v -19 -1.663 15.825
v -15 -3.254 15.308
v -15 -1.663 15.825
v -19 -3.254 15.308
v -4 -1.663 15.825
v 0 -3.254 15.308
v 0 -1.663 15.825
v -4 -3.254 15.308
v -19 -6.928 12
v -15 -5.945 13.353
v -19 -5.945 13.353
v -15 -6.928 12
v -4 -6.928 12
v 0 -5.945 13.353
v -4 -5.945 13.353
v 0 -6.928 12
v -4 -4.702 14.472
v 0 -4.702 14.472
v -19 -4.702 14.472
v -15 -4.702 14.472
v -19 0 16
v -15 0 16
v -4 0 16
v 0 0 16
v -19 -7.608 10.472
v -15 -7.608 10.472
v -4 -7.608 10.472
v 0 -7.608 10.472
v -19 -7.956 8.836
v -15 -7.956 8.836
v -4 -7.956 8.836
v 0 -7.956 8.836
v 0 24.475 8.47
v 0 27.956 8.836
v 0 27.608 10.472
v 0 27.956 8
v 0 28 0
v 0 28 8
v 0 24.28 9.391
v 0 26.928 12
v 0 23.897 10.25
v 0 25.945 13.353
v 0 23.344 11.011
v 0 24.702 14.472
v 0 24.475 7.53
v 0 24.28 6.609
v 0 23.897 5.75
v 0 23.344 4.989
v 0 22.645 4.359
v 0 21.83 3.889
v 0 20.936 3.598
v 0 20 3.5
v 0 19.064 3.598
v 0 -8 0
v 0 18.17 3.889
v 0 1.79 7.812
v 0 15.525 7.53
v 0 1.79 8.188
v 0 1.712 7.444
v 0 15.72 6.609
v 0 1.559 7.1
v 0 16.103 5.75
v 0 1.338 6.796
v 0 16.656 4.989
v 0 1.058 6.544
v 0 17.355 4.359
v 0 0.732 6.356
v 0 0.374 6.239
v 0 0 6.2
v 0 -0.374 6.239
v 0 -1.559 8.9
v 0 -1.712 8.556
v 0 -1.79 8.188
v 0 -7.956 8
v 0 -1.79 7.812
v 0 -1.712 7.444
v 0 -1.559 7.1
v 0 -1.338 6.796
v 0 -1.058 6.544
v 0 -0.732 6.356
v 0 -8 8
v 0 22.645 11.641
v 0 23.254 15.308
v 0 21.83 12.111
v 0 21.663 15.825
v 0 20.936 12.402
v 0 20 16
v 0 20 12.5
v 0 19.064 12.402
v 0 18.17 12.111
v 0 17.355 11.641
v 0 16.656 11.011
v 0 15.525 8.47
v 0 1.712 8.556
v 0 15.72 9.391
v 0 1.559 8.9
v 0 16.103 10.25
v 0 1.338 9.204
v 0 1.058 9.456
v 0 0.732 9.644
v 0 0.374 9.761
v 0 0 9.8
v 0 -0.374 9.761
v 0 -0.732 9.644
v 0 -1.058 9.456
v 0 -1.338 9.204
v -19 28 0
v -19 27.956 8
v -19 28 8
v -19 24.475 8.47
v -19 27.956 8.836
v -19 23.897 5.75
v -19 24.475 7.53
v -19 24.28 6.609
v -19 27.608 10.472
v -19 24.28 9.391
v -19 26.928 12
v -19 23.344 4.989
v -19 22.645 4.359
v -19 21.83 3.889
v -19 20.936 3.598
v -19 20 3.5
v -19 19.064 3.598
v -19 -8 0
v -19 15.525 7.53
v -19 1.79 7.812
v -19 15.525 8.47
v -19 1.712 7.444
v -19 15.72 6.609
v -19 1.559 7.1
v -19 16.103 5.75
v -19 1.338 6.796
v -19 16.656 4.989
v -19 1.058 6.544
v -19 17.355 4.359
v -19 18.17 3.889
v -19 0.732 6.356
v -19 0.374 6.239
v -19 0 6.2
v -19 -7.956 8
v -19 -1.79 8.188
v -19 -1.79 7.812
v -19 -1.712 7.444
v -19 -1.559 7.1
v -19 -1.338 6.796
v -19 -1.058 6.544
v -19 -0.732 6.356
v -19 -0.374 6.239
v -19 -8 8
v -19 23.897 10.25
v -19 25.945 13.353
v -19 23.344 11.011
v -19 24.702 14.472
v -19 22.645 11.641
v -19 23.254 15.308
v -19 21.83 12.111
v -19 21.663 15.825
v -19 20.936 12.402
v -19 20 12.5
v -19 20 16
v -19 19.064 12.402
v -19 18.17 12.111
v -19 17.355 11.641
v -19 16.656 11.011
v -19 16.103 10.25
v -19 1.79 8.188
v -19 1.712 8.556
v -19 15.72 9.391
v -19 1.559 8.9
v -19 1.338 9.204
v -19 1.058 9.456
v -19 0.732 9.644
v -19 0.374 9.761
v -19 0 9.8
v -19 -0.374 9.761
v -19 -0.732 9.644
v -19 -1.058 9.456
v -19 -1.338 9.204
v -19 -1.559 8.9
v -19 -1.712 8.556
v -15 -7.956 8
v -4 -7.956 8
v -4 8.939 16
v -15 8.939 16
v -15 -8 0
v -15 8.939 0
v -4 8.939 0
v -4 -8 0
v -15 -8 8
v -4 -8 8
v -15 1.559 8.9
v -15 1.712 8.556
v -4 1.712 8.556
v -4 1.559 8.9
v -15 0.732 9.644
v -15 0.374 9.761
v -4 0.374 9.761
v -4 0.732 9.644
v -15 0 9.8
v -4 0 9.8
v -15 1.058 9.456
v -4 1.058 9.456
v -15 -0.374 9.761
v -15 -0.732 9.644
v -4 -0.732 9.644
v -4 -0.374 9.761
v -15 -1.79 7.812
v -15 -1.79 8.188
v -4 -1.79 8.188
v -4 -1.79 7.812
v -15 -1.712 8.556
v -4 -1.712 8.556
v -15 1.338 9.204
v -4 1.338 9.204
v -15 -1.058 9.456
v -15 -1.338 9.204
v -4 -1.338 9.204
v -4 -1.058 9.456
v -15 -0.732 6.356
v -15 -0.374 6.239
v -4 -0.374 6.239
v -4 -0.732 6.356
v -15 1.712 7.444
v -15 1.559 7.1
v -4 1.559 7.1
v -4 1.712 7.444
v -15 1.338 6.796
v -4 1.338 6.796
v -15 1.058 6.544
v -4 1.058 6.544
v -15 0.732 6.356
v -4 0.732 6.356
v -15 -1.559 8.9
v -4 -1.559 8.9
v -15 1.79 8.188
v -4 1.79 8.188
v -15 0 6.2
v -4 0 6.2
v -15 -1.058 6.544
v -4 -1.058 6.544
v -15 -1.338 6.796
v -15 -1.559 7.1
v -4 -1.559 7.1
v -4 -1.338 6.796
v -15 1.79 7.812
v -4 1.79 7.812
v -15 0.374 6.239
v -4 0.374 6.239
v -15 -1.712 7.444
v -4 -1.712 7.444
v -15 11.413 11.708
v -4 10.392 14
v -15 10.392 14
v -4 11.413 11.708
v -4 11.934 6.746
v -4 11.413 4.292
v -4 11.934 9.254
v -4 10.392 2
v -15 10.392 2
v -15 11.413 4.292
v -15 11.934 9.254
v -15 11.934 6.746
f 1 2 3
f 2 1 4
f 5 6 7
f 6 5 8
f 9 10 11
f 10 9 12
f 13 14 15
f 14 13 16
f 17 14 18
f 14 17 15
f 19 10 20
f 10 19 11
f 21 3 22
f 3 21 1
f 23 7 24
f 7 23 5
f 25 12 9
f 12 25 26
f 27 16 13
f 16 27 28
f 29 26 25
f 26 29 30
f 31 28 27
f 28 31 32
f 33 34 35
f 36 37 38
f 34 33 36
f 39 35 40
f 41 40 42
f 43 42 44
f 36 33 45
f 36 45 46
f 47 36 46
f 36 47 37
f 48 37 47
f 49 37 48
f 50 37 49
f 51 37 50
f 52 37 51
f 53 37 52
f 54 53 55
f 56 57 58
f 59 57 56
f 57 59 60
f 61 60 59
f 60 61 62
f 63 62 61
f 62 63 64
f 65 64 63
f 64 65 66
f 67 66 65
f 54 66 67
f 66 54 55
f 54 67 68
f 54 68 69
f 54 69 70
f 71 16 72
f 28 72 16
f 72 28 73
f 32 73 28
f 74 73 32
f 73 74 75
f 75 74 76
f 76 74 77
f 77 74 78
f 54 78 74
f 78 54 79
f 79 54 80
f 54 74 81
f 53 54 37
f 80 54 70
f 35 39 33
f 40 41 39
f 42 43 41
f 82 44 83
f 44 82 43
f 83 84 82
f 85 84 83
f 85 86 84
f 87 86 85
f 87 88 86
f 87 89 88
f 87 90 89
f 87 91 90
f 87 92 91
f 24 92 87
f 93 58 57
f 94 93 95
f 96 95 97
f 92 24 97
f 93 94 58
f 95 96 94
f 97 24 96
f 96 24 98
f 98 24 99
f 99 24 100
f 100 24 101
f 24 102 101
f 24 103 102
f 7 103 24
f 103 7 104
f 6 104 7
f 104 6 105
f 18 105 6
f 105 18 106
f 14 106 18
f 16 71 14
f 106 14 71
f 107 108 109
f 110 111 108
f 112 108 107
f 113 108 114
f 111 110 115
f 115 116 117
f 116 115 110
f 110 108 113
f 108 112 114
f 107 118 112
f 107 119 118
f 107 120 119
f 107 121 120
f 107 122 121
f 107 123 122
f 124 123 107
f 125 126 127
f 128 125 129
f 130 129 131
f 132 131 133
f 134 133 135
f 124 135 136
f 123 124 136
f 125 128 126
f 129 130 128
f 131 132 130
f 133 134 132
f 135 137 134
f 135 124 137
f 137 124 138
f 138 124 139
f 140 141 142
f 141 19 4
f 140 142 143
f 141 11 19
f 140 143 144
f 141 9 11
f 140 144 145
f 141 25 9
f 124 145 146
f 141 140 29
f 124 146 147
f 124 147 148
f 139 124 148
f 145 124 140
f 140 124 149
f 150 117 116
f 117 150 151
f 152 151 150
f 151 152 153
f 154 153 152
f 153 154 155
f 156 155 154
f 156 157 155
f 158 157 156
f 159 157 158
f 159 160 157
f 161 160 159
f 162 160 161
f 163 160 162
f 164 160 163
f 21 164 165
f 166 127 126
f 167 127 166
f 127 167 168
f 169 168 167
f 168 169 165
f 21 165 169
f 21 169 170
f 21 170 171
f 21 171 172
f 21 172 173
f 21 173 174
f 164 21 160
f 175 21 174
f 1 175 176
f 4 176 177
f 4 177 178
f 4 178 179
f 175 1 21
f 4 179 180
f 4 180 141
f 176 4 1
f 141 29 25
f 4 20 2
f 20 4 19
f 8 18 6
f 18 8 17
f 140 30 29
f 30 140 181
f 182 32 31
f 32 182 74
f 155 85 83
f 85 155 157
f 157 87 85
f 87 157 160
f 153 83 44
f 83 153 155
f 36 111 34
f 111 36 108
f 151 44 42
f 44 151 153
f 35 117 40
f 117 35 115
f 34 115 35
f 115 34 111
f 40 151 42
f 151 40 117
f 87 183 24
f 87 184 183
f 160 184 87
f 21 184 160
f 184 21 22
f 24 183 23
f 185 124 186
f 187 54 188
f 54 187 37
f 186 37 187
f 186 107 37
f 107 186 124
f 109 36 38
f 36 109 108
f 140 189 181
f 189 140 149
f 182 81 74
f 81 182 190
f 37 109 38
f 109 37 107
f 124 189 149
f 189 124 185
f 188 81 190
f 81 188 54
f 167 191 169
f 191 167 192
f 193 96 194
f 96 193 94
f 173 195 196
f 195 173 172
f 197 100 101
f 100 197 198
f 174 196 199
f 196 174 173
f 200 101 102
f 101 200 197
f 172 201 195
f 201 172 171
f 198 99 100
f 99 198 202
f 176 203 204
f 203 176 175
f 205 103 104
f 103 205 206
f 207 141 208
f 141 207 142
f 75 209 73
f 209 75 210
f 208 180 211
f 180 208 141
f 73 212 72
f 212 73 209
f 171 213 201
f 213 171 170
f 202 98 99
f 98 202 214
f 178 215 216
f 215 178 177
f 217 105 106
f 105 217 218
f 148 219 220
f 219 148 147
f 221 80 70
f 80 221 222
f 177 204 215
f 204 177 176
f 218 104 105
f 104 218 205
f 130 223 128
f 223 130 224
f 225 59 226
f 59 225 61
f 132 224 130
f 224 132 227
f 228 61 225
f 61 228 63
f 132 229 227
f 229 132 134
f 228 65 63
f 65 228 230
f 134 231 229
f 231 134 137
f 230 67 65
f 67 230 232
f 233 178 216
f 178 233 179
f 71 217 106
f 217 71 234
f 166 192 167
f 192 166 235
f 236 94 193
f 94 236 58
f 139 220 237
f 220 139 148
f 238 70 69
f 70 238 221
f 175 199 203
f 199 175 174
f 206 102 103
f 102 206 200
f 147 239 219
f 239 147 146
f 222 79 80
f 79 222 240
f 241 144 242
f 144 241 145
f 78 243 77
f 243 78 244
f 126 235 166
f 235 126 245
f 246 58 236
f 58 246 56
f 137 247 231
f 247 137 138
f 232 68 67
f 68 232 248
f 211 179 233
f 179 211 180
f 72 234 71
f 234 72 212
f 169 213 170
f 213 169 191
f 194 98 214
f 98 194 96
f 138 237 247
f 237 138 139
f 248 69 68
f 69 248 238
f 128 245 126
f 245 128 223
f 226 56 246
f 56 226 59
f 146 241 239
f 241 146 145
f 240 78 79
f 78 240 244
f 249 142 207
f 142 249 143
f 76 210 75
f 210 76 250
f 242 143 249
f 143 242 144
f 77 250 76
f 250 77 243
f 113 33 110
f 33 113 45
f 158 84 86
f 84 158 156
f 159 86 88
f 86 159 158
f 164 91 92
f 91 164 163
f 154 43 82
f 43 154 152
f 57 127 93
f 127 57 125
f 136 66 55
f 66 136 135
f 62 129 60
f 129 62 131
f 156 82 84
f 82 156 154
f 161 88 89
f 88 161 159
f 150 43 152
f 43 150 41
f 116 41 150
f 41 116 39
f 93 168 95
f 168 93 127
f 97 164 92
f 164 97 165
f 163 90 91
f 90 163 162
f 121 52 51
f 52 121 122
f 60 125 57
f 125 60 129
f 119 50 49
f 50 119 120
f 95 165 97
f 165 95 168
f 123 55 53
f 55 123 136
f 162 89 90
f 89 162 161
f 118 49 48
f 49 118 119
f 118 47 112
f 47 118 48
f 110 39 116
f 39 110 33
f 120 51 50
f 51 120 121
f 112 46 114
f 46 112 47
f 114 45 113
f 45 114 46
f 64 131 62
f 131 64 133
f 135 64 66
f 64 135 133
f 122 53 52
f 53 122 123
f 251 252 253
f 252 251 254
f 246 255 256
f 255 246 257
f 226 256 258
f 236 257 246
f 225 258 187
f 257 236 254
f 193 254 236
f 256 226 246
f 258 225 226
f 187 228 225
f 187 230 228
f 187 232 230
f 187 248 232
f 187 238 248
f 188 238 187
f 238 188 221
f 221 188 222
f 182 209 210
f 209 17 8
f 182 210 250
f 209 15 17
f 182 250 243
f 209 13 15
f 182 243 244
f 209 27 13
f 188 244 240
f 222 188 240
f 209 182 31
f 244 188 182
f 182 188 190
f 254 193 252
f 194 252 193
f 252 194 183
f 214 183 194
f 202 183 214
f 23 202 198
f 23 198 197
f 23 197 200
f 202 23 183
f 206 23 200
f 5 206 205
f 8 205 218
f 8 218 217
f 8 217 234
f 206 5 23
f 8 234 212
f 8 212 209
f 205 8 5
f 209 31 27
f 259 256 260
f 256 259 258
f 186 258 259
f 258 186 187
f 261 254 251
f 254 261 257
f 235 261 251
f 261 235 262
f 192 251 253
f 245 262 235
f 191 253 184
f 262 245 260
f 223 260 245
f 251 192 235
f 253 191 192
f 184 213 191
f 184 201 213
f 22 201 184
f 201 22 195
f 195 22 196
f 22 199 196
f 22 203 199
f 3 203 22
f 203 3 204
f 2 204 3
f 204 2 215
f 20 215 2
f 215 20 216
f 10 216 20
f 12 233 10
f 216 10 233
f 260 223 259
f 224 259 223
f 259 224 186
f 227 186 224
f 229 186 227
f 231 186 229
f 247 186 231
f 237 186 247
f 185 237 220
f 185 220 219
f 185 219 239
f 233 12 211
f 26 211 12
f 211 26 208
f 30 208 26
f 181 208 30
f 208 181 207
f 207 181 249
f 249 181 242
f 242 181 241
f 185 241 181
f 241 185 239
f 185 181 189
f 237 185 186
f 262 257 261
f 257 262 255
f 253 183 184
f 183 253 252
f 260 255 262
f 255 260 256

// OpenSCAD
// file: parameters.scad
// PRUSA iteration3
// Y frame corners
// GNU GPL v3
// Josef Průša <iam@josefprusa.cz> and contributors
// http://www.reprap.org/wiki/Prusa_Mendel
// http://prusamendel.org
// Parameterized by D. Scott Williamson

// MASTER PARAMETERS FILE

// Default to original metric 
metric=true;

// mm in an inch (comversion rate)
inch2mm=25.4;

// Default facets for cylinders
$fn=30;

// Parameters related to printer base 
// affected parts:
//		y-corners.scad
//		y-motor.scad
// 		y-idler.scad
// 		y-distance.scad

	// horizontal rod dimensions
	horizontal_rod_radius = (metric ? 4 : ((5/16)*inch2mm/2));
	horizontal_rod_hole_radius= horizontal_rod_radius + 0.4;
	horizontal_rod_length=270;
	horizontal_rod_bridge_radius=2.6;
	horizontal_rod_washer_radius=(metric ? 10 : ((15/16)*inch2mm/2));
	horizontal_rod_lower_height=horizontal_rod_washer_radius;
	horizontal_rod_upper_height=horizontal_rod_washer_radius*3;
	
	// longitudinal rod dimensions
	longitudinal_rod_radius= (metric ? 5 : ((1/2)*inch2mm/2));
	longitudinal_rod_hole_radius= longitudinal_rod_radius + 0.4;
	longitudinal_rod_length=270;
	longitudinal_rod_height=20;
	
	longitudinal_rod_washer_radius=(metric ? 11 : ((1+3/8)*inch2mm/2));
	longitudinal_rod_washer_hole_radius=longitudinal_rod_washer_radius + 0.4;
	longitudinal_rod_washer_thickness=10;
	
	smooth_rod_radius=4.2;
	smooth_rod_length=10;
	smooth_rod_height=47;
	smooth_rod_end_thickness=2.75;
	
	corner_width=(longitudinal_rod_radius*2)+8;
	corner_height=(horizontal_rod_radius*2)+14;
	corner_depth=49;
	
	lm8uu_keepout_radius=8;
	lm8uu_keepout_length=270;
	lm8uu_keepout_height=smooth_rod_height-1;
	lm8uu_keepout_offset=12.5;
	
	ziptie_width=3.5;
	ziptie_length=30;
	ziptie_height=2;
// main file
// PRUSA iteration3
// Y idler
// GNU GPL v3
// Josef Průša <iam@josefprusa.cz> and contributors
// http://www.reprap.org/wiki/Prusa_Mendel
// http://prusamendel.org
// Parameterized by D. Scott Williamson

// Include master parameters file
include <parameters.scad>;

// Override metric setting here if desired (anywhere after include)
//metric=false;


module y_idler_base(){
 translate(v = [0,0,0]) cylinder(h = 19, r=8);	
 translate(v = [0,20,0]) cylinder(h = 19, r=8);
 translate(v = [0,10,9.5]) cube(size = [16,20,19], center=true);
 translate(v = [-4,10,9.5]) cube(size = [8,16+20,19], center=true);
}

module y_idler_holes(){
 translate(v = [0,0,-1]) cylinder(h = 120, r=1.8);	
 translate(v = [0,20,-1]) cylinder(h = 25, r=4.5);
 translate(v = [0,0,4]) cylinder(h = 11, r=12);
}

// Final part
module y_idler(){
 translate(v = [0,0,8])rotate([0,-90,0]) difference(){
  y_idler_base();
  y_idler_holes();
 }
}

y_idler();
